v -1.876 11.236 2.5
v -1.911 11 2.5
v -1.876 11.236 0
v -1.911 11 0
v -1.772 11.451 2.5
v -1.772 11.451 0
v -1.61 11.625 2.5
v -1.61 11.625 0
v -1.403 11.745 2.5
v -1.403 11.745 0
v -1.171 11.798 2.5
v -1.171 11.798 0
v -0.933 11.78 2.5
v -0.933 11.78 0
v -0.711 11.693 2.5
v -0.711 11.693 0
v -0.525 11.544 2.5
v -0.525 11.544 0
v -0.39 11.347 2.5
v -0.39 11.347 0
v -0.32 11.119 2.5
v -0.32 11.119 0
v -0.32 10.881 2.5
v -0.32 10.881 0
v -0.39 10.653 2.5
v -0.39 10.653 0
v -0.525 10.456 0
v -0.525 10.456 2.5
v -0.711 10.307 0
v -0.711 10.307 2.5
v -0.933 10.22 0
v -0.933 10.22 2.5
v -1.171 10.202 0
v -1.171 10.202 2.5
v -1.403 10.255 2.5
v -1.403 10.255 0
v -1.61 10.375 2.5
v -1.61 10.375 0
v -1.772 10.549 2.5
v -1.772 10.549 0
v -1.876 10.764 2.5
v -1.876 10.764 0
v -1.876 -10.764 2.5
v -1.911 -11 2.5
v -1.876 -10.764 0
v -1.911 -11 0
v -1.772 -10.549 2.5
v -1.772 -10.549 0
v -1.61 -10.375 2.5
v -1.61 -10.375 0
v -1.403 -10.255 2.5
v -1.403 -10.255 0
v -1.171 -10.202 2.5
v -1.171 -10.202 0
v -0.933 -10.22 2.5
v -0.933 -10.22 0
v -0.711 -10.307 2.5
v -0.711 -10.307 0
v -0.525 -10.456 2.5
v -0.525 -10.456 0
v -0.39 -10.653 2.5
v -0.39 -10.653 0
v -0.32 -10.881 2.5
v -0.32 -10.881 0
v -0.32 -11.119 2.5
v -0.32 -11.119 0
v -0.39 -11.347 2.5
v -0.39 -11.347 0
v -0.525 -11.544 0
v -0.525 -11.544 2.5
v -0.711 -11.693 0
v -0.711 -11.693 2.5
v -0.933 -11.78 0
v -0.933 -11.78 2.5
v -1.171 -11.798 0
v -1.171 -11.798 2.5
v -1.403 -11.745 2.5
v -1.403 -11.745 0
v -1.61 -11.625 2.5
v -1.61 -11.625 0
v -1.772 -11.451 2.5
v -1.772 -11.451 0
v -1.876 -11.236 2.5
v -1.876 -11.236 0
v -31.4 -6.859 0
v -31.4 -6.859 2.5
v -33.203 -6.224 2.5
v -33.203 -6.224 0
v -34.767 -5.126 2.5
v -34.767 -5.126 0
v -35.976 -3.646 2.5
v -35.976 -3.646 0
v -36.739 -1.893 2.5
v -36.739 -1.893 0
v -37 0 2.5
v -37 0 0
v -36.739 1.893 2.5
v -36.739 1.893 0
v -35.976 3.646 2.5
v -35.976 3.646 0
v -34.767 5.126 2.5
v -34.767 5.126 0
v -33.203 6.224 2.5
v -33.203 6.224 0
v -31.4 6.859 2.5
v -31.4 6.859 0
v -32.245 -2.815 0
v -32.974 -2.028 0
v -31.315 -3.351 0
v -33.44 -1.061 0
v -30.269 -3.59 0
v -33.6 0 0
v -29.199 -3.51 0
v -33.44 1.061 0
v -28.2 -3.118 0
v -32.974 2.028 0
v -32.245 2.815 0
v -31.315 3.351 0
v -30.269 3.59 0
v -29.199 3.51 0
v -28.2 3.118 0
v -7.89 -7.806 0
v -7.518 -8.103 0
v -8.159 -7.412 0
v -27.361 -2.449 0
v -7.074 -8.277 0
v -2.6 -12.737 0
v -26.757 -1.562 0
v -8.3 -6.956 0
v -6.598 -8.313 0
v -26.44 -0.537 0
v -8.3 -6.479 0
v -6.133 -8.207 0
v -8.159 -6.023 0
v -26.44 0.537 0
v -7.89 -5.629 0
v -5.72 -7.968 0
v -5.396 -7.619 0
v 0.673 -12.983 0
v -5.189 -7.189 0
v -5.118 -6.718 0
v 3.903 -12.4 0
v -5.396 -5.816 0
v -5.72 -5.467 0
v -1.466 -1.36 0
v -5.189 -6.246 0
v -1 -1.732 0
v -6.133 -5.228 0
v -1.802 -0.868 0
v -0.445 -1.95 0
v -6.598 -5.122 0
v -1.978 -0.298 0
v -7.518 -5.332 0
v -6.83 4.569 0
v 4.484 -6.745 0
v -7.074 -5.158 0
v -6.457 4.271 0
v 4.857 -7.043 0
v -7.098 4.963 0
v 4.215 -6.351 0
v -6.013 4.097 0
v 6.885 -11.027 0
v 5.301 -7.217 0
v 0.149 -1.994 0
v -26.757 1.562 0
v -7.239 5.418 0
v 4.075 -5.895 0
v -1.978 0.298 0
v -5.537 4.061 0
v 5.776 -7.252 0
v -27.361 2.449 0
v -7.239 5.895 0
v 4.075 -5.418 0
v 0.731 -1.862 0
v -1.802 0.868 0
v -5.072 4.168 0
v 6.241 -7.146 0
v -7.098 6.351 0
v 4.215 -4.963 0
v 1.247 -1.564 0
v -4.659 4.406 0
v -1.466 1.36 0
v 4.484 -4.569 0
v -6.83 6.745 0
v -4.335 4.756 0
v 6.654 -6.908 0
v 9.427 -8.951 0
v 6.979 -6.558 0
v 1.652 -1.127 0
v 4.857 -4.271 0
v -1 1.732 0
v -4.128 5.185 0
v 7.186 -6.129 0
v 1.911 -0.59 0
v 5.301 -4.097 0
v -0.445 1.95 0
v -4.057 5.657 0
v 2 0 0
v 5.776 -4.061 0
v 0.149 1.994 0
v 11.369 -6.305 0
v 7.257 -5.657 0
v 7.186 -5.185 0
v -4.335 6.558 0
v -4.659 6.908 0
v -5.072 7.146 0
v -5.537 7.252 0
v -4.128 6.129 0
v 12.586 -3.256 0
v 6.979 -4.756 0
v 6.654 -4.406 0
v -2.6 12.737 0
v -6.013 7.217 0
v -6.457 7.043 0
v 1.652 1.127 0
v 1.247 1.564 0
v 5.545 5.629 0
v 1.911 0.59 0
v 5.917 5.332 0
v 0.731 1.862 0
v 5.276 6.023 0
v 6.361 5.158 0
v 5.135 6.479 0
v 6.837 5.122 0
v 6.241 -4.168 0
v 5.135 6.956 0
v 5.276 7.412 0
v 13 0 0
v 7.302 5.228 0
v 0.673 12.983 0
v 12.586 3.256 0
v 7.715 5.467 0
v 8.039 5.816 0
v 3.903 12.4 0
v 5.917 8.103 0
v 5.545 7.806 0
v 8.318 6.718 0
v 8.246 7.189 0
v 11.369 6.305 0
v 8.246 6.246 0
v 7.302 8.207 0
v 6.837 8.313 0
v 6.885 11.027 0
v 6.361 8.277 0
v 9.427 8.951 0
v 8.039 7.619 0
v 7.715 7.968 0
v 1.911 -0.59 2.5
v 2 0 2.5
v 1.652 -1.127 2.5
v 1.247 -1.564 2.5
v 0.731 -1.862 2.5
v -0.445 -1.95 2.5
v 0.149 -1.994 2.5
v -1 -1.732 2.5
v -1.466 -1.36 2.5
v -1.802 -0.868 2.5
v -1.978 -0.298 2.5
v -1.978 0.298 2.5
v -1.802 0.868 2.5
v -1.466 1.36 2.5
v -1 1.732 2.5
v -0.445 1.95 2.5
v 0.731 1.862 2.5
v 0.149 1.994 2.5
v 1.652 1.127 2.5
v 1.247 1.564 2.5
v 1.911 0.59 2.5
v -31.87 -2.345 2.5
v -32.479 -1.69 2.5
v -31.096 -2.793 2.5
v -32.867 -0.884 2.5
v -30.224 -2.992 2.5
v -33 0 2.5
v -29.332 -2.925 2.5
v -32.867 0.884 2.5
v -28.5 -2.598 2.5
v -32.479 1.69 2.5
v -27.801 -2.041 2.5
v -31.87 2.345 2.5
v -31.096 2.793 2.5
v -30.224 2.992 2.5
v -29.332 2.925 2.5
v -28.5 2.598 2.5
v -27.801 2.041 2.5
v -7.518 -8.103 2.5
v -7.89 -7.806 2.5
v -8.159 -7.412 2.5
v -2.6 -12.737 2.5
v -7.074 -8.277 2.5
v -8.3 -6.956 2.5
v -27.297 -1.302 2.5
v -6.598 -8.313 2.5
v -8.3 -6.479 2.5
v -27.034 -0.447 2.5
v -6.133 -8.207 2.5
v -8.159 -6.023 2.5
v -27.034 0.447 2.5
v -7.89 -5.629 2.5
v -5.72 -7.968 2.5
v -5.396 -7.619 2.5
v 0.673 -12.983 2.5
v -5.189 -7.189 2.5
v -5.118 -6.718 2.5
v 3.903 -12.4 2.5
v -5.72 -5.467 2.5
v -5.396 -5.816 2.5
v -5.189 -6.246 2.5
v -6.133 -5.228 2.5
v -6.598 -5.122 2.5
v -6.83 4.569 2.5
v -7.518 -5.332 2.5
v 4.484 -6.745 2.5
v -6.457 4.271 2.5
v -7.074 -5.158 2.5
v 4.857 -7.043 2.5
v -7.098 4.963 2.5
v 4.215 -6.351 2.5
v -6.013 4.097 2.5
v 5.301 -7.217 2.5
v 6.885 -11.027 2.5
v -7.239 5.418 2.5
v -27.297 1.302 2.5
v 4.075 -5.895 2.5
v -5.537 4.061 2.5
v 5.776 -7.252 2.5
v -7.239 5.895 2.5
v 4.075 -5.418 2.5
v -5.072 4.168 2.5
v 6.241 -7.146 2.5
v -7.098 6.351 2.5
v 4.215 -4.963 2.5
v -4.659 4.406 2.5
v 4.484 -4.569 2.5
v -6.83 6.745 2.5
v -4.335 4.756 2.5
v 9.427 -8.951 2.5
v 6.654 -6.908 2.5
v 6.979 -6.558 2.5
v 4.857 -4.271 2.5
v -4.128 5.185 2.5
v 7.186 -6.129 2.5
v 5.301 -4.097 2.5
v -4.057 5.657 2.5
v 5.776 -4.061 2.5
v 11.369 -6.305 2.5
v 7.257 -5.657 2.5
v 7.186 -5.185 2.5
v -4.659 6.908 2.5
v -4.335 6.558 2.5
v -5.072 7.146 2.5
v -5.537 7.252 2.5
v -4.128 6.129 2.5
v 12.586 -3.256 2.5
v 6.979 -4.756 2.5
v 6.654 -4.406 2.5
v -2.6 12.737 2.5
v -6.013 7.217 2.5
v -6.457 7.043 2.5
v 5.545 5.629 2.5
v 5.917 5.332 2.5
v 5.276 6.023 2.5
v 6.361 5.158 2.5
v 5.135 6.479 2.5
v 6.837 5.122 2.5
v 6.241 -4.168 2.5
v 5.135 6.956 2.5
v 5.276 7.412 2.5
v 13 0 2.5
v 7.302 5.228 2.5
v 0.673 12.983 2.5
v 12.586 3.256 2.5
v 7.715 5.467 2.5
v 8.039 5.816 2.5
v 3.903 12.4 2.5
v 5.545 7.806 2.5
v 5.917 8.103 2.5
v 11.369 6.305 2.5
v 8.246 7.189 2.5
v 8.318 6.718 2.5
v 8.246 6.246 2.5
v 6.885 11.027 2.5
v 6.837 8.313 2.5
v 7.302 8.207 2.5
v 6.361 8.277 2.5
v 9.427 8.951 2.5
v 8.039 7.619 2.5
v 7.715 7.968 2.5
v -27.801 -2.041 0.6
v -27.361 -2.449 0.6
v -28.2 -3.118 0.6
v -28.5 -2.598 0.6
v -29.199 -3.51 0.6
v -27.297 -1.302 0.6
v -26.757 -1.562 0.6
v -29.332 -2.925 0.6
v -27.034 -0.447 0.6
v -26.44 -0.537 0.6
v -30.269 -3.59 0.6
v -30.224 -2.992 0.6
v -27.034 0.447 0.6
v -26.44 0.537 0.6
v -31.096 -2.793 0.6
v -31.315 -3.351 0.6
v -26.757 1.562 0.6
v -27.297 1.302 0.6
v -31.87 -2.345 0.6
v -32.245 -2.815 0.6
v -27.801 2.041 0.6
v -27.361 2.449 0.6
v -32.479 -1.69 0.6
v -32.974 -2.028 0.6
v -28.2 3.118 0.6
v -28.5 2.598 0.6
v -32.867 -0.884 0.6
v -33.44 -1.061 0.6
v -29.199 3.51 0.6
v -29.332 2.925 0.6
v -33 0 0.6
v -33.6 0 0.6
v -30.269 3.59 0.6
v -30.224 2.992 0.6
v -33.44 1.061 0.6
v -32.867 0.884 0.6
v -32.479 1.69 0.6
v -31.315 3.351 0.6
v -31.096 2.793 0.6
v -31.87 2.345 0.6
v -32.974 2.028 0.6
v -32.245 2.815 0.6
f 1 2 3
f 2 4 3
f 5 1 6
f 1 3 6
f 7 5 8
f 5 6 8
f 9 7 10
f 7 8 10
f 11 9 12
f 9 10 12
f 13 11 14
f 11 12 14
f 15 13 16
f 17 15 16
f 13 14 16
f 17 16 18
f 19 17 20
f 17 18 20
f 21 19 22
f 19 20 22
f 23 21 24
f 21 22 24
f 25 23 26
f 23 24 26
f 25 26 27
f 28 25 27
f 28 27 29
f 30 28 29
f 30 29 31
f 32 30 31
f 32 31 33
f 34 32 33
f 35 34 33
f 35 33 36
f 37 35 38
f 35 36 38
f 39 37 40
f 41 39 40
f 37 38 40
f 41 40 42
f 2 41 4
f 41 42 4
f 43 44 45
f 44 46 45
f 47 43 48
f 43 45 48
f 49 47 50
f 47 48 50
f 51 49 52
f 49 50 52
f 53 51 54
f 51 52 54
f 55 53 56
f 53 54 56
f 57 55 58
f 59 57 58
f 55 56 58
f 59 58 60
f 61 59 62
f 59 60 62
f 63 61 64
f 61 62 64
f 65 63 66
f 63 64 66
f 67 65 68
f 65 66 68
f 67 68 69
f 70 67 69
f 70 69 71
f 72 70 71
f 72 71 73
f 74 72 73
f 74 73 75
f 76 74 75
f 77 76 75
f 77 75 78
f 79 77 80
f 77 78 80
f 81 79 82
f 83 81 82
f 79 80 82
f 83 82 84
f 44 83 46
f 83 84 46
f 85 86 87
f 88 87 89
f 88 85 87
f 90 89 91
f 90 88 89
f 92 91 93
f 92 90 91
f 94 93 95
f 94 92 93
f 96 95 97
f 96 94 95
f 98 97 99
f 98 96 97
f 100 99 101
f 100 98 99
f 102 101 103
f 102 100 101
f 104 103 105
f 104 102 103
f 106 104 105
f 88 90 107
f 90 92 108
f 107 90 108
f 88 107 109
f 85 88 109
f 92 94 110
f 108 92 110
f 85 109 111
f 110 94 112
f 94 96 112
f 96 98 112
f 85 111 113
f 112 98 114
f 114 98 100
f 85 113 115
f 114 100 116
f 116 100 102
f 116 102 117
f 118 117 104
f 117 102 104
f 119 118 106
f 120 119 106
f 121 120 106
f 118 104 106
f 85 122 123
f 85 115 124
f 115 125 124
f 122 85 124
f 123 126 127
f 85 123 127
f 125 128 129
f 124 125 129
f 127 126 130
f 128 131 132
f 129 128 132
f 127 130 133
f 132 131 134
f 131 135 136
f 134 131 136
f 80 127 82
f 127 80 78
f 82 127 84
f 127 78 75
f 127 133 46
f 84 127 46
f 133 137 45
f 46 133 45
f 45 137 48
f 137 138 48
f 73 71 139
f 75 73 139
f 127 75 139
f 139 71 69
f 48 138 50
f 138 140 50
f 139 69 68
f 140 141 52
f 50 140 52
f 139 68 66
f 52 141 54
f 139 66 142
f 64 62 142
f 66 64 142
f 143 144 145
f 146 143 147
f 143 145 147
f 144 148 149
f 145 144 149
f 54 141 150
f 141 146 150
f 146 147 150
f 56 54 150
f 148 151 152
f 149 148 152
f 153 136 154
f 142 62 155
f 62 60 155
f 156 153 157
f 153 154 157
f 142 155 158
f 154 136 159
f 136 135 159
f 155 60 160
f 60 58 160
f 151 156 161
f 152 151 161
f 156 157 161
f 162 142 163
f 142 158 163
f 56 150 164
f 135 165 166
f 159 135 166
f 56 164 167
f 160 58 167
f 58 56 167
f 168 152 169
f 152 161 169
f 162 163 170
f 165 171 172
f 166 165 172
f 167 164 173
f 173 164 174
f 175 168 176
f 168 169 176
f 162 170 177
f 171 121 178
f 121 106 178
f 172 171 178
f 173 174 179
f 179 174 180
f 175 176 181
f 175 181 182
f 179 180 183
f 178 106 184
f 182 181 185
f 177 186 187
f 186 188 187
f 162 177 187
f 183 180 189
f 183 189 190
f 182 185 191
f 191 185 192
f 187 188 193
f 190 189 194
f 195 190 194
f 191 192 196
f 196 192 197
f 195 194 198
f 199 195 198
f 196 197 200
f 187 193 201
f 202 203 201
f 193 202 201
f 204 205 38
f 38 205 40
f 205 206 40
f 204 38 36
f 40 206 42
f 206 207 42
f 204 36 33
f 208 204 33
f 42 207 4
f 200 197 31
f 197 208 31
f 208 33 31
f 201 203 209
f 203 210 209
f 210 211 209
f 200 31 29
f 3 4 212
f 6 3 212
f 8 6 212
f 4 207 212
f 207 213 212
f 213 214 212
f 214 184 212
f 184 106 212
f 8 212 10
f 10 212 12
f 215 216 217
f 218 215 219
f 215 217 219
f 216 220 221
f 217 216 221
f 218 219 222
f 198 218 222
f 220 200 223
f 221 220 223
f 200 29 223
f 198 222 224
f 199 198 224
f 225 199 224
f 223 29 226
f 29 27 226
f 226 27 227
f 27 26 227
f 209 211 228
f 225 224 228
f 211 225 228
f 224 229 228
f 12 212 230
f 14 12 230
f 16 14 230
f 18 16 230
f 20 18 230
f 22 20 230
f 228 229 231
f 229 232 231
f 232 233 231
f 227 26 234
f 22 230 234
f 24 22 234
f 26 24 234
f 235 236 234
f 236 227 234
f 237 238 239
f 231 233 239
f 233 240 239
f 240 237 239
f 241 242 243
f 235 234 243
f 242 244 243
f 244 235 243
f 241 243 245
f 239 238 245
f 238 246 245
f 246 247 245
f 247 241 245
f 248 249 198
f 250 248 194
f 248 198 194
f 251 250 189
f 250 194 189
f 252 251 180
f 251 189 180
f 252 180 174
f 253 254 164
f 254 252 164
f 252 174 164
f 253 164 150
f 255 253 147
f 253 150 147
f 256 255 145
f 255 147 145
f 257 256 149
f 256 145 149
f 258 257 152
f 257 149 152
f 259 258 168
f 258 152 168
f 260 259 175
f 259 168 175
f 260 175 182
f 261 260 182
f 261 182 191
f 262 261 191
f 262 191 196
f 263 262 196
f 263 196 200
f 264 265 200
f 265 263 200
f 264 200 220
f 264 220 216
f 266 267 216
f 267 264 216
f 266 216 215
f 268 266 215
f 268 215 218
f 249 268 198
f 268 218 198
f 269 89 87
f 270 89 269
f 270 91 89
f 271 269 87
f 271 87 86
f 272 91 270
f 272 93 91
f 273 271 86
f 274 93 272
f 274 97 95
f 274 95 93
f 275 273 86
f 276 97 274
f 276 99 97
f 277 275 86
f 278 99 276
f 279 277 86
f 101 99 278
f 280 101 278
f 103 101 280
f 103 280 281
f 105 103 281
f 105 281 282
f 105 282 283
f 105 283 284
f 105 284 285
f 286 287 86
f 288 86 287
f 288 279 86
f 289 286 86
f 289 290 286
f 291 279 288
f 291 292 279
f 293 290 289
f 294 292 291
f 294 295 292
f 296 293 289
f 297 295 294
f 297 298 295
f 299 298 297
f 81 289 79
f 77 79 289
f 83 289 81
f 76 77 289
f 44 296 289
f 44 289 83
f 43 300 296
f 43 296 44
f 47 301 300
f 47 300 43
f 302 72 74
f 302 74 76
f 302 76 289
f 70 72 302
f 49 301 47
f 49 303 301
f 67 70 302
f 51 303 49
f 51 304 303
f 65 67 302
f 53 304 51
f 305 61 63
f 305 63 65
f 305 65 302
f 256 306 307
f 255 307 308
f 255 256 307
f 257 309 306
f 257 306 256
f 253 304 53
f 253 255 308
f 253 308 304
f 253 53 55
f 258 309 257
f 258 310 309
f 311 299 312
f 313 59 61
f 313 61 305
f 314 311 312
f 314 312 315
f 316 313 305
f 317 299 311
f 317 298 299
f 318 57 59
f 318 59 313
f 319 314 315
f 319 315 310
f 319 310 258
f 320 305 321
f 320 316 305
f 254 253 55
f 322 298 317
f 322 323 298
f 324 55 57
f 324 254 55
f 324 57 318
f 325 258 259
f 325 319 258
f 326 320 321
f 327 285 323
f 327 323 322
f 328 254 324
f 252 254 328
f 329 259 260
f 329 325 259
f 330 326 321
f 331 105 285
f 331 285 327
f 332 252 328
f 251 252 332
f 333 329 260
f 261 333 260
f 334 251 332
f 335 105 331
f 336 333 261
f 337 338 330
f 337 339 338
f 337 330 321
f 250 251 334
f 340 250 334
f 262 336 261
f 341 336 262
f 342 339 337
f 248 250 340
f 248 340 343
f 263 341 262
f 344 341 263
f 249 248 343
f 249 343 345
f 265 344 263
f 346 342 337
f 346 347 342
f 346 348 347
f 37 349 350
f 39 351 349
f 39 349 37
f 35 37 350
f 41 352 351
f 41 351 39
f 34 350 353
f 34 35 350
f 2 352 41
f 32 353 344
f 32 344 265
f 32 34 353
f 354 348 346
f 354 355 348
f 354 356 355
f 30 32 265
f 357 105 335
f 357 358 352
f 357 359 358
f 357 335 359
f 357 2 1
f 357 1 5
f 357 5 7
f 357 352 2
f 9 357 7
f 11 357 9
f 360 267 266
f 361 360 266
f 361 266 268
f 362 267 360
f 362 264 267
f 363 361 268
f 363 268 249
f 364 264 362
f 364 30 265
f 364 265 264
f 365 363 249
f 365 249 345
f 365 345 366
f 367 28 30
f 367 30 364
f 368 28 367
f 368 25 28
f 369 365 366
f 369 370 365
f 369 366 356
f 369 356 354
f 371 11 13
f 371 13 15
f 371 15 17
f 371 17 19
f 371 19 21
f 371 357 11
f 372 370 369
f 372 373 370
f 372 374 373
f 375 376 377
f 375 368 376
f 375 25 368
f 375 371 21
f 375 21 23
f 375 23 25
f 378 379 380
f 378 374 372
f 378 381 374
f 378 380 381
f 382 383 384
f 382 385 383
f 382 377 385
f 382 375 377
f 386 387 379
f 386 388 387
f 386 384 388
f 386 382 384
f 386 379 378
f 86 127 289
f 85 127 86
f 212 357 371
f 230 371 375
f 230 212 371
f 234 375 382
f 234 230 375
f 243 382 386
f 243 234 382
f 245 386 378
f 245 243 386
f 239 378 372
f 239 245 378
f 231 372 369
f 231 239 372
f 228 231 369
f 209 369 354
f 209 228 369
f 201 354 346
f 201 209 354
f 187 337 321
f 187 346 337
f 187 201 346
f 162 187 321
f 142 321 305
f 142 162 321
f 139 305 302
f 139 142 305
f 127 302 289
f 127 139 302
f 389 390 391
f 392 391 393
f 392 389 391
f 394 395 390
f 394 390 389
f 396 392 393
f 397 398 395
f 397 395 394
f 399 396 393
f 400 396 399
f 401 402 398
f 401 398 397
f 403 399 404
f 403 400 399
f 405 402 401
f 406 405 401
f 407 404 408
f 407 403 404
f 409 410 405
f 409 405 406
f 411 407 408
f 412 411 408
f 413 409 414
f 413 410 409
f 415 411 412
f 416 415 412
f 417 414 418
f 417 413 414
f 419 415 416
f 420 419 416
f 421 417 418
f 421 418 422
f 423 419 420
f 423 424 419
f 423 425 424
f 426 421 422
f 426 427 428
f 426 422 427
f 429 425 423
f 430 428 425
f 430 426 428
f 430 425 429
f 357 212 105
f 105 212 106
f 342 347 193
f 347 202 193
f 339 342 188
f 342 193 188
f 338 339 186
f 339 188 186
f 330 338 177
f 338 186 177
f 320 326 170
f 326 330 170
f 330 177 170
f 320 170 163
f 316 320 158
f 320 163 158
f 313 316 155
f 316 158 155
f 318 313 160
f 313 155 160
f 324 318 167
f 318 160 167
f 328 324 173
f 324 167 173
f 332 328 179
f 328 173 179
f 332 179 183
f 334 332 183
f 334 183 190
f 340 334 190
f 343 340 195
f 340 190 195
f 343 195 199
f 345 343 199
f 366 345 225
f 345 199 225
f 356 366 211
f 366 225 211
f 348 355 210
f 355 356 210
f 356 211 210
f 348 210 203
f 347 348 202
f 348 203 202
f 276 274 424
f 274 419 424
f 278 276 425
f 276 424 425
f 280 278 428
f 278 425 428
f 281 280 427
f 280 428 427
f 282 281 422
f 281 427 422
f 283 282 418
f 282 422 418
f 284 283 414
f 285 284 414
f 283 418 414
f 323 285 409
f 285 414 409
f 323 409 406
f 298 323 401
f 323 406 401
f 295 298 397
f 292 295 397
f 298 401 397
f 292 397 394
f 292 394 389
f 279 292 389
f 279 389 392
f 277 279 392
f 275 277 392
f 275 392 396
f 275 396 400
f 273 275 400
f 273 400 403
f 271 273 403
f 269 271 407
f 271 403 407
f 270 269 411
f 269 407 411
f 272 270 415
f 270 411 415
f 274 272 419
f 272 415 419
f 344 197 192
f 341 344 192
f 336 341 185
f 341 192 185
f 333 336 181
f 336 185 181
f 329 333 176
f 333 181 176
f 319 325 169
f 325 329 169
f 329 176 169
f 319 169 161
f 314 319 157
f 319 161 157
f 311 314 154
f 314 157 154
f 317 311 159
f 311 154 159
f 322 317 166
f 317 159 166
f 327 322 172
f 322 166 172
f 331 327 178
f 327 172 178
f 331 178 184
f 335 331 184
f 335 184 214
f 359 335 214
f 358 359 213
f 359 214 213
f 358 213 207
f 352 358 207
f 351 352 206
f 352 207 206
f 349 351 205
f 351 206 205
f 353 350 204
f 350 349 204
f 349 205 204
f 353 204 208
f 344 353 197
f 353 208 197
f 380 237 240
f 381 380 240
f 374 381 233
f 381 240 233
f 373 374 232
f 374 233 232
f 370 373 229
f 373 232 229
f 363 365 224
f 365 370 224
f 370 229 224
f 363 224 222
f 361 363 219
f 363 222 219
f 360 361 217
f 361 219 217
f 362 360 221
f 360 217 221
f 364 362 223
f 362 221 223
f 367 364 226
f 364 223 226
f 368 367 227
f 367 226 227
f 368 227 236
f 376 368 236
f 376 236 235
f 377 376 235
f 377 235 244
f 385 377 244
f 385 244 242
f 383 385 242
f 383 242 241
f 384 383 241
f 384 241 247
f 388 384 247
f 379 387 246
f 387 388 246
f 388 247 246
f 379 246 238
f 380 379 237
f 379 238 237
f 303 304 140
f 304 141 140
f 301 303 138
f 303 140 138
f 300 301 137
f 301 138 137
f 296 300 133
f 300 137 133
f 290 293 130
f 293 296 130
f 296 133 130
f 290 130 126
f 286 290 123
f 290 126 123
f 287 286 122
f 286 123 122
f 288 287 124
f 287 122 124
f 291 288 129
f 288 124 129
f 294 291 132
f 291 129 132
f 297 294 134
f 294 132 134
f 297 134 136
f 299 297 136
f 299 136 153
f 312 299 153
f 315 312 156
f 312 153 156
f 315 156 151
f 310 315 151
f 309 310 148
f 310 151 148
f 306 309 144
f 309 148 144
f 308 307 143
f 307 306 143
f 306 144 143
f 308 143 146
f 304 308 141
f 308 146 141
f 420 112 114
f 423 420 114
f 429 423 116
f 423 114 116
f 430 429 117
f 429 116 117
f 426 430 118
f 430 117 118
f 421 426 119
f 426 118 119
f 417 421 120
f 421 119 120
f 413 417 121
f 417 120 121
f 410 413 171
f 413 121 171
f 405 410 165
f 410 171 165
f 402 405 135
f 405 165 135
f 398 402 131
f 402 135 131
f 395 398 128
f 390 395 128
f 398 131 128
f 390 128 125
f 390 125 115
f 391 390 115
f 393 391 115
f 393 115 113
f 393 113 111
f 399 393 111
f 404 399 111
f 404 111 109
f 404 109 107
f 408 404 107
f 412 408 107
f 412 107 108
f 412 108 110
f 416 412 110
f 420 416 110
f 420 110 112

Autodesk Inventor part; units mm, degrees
ref_plane "YZ Plane" through (0, 0, 0) normal (1, 0, 0) x (0, 1, 0)
ref_plane "XZ Plane" through (0, 0, 0) normal (0, 1, 0) x (-1, 0, 0)
ref_plane "XY Plane" through (0, 0, 0) normal (0, 0, 1) x (1, 0, 0)
sketch "スケッチ1" plane through (0, 0, 0) normal (0, 0, 1) x (1, 0, 0)
  circle A0 centre (0, 0) radius 13
  line L0 (-2.6, 12.7373) -> (-31.4, 6.8586)
  line L1 (-2.6, -12.7373) -> (-31.4, -6.8586)
  arc A1 (-31.4, 6.8586) -> (-31.4, -6.8586) centre (-30, 0) ccw
  line L2 (-47, 0) -> (23, 0) projected
  circle A2 centre (-5.6569, 5.6569) radius 1.6 projected
  circle A3 centre (6.7175, 6.7175) radius 1.6 projected
  circle A4 centre (5.6569, -5.6569) radius 1.6 projected
  circle A5 centre (-6.7175, -6.7175) radius 1.6 projected
  circle A6 centre (0, 0) radius 2
  dimension "d0" = 30
  dimension "d1" = 26
  dimension "d2" = 7
  dimension "d5" = 4
extrude "押し出し1" add sketch "スケッチ1" along normal blind 2.5 contours L2 A6 A0 | A0 L2 A6 | A0 L2 A1 L0 | L1 A1 L2 A0
sketch "スケッチ2" plane through (0, 0, 0) normal (0, 0, -1) x (-1, 0, 0)
  circle A0 centre (30, 0) radius 3
  circle A1 centre (30, 0) radius 1.5
  circle A2 centre (30, 0) radius 3.6
  line L0 (47, 0) -> (-23, 0) projected
  arc A3 (31.4, -6.8586) -> (31.4, 6.8586) centre (30, 0) ccw projected
  circle A4 centre (1.1112, 11) radius 0.8
  circle A5 centre (1.1112, -11) radius 0.8
  circle A6 centre (1.1112, 11) radius 2 construction
  circle A7 centre (1.1112, -11) radius 2 construction
  line L1 (2.6, 12.7373) -> (31.4, 6.8586) projected
  circle A8 centre (5.6569, 5.6569) radius 1.6 projected
  circle A9 centre (5.6569, 5.6569) radius 1.6
  circle A10 centre (6.7175, -6.7175) radius 1.6
  circle A11 centre (5.6569, 5.6569) radius 3 construction
  circle A12 centre (6.7175, -6.7175) radius 3 construction
  point P0 (0, 0)
  dimension "d6" = 6
  dimension "d7" = 3
  dimension "d8" = 7.2
  dimension "d13" = 1.6
  dimension "d15" = 4
  dimension "d16" = 6
  dimension "d18" = 22
extrude "押し出し2" cut sketch "スケッチ2" against normal blind 0.6 contours L0 A1 A0 | L0 A2 A0 | A0 L0 A2 | A0 L0 A1 | L0 A1 | A1 L0
extrude "押し出し3" cut sketch "スケッチ2" against normal up to surface (2.5 mm away) contours L0 A1 A0 | A0 L0 A1 | L0 A1 | A1 L0 | A4 | A5
thread "ねじ1" size "M2x0.4" class "6H" standard "ANSI Metric M Profile" full length
thread "ねじ2" size "M2x0.4" class "6H" standard "ANSI Metric M Profile" full length
properties part number "Dribler_main"
